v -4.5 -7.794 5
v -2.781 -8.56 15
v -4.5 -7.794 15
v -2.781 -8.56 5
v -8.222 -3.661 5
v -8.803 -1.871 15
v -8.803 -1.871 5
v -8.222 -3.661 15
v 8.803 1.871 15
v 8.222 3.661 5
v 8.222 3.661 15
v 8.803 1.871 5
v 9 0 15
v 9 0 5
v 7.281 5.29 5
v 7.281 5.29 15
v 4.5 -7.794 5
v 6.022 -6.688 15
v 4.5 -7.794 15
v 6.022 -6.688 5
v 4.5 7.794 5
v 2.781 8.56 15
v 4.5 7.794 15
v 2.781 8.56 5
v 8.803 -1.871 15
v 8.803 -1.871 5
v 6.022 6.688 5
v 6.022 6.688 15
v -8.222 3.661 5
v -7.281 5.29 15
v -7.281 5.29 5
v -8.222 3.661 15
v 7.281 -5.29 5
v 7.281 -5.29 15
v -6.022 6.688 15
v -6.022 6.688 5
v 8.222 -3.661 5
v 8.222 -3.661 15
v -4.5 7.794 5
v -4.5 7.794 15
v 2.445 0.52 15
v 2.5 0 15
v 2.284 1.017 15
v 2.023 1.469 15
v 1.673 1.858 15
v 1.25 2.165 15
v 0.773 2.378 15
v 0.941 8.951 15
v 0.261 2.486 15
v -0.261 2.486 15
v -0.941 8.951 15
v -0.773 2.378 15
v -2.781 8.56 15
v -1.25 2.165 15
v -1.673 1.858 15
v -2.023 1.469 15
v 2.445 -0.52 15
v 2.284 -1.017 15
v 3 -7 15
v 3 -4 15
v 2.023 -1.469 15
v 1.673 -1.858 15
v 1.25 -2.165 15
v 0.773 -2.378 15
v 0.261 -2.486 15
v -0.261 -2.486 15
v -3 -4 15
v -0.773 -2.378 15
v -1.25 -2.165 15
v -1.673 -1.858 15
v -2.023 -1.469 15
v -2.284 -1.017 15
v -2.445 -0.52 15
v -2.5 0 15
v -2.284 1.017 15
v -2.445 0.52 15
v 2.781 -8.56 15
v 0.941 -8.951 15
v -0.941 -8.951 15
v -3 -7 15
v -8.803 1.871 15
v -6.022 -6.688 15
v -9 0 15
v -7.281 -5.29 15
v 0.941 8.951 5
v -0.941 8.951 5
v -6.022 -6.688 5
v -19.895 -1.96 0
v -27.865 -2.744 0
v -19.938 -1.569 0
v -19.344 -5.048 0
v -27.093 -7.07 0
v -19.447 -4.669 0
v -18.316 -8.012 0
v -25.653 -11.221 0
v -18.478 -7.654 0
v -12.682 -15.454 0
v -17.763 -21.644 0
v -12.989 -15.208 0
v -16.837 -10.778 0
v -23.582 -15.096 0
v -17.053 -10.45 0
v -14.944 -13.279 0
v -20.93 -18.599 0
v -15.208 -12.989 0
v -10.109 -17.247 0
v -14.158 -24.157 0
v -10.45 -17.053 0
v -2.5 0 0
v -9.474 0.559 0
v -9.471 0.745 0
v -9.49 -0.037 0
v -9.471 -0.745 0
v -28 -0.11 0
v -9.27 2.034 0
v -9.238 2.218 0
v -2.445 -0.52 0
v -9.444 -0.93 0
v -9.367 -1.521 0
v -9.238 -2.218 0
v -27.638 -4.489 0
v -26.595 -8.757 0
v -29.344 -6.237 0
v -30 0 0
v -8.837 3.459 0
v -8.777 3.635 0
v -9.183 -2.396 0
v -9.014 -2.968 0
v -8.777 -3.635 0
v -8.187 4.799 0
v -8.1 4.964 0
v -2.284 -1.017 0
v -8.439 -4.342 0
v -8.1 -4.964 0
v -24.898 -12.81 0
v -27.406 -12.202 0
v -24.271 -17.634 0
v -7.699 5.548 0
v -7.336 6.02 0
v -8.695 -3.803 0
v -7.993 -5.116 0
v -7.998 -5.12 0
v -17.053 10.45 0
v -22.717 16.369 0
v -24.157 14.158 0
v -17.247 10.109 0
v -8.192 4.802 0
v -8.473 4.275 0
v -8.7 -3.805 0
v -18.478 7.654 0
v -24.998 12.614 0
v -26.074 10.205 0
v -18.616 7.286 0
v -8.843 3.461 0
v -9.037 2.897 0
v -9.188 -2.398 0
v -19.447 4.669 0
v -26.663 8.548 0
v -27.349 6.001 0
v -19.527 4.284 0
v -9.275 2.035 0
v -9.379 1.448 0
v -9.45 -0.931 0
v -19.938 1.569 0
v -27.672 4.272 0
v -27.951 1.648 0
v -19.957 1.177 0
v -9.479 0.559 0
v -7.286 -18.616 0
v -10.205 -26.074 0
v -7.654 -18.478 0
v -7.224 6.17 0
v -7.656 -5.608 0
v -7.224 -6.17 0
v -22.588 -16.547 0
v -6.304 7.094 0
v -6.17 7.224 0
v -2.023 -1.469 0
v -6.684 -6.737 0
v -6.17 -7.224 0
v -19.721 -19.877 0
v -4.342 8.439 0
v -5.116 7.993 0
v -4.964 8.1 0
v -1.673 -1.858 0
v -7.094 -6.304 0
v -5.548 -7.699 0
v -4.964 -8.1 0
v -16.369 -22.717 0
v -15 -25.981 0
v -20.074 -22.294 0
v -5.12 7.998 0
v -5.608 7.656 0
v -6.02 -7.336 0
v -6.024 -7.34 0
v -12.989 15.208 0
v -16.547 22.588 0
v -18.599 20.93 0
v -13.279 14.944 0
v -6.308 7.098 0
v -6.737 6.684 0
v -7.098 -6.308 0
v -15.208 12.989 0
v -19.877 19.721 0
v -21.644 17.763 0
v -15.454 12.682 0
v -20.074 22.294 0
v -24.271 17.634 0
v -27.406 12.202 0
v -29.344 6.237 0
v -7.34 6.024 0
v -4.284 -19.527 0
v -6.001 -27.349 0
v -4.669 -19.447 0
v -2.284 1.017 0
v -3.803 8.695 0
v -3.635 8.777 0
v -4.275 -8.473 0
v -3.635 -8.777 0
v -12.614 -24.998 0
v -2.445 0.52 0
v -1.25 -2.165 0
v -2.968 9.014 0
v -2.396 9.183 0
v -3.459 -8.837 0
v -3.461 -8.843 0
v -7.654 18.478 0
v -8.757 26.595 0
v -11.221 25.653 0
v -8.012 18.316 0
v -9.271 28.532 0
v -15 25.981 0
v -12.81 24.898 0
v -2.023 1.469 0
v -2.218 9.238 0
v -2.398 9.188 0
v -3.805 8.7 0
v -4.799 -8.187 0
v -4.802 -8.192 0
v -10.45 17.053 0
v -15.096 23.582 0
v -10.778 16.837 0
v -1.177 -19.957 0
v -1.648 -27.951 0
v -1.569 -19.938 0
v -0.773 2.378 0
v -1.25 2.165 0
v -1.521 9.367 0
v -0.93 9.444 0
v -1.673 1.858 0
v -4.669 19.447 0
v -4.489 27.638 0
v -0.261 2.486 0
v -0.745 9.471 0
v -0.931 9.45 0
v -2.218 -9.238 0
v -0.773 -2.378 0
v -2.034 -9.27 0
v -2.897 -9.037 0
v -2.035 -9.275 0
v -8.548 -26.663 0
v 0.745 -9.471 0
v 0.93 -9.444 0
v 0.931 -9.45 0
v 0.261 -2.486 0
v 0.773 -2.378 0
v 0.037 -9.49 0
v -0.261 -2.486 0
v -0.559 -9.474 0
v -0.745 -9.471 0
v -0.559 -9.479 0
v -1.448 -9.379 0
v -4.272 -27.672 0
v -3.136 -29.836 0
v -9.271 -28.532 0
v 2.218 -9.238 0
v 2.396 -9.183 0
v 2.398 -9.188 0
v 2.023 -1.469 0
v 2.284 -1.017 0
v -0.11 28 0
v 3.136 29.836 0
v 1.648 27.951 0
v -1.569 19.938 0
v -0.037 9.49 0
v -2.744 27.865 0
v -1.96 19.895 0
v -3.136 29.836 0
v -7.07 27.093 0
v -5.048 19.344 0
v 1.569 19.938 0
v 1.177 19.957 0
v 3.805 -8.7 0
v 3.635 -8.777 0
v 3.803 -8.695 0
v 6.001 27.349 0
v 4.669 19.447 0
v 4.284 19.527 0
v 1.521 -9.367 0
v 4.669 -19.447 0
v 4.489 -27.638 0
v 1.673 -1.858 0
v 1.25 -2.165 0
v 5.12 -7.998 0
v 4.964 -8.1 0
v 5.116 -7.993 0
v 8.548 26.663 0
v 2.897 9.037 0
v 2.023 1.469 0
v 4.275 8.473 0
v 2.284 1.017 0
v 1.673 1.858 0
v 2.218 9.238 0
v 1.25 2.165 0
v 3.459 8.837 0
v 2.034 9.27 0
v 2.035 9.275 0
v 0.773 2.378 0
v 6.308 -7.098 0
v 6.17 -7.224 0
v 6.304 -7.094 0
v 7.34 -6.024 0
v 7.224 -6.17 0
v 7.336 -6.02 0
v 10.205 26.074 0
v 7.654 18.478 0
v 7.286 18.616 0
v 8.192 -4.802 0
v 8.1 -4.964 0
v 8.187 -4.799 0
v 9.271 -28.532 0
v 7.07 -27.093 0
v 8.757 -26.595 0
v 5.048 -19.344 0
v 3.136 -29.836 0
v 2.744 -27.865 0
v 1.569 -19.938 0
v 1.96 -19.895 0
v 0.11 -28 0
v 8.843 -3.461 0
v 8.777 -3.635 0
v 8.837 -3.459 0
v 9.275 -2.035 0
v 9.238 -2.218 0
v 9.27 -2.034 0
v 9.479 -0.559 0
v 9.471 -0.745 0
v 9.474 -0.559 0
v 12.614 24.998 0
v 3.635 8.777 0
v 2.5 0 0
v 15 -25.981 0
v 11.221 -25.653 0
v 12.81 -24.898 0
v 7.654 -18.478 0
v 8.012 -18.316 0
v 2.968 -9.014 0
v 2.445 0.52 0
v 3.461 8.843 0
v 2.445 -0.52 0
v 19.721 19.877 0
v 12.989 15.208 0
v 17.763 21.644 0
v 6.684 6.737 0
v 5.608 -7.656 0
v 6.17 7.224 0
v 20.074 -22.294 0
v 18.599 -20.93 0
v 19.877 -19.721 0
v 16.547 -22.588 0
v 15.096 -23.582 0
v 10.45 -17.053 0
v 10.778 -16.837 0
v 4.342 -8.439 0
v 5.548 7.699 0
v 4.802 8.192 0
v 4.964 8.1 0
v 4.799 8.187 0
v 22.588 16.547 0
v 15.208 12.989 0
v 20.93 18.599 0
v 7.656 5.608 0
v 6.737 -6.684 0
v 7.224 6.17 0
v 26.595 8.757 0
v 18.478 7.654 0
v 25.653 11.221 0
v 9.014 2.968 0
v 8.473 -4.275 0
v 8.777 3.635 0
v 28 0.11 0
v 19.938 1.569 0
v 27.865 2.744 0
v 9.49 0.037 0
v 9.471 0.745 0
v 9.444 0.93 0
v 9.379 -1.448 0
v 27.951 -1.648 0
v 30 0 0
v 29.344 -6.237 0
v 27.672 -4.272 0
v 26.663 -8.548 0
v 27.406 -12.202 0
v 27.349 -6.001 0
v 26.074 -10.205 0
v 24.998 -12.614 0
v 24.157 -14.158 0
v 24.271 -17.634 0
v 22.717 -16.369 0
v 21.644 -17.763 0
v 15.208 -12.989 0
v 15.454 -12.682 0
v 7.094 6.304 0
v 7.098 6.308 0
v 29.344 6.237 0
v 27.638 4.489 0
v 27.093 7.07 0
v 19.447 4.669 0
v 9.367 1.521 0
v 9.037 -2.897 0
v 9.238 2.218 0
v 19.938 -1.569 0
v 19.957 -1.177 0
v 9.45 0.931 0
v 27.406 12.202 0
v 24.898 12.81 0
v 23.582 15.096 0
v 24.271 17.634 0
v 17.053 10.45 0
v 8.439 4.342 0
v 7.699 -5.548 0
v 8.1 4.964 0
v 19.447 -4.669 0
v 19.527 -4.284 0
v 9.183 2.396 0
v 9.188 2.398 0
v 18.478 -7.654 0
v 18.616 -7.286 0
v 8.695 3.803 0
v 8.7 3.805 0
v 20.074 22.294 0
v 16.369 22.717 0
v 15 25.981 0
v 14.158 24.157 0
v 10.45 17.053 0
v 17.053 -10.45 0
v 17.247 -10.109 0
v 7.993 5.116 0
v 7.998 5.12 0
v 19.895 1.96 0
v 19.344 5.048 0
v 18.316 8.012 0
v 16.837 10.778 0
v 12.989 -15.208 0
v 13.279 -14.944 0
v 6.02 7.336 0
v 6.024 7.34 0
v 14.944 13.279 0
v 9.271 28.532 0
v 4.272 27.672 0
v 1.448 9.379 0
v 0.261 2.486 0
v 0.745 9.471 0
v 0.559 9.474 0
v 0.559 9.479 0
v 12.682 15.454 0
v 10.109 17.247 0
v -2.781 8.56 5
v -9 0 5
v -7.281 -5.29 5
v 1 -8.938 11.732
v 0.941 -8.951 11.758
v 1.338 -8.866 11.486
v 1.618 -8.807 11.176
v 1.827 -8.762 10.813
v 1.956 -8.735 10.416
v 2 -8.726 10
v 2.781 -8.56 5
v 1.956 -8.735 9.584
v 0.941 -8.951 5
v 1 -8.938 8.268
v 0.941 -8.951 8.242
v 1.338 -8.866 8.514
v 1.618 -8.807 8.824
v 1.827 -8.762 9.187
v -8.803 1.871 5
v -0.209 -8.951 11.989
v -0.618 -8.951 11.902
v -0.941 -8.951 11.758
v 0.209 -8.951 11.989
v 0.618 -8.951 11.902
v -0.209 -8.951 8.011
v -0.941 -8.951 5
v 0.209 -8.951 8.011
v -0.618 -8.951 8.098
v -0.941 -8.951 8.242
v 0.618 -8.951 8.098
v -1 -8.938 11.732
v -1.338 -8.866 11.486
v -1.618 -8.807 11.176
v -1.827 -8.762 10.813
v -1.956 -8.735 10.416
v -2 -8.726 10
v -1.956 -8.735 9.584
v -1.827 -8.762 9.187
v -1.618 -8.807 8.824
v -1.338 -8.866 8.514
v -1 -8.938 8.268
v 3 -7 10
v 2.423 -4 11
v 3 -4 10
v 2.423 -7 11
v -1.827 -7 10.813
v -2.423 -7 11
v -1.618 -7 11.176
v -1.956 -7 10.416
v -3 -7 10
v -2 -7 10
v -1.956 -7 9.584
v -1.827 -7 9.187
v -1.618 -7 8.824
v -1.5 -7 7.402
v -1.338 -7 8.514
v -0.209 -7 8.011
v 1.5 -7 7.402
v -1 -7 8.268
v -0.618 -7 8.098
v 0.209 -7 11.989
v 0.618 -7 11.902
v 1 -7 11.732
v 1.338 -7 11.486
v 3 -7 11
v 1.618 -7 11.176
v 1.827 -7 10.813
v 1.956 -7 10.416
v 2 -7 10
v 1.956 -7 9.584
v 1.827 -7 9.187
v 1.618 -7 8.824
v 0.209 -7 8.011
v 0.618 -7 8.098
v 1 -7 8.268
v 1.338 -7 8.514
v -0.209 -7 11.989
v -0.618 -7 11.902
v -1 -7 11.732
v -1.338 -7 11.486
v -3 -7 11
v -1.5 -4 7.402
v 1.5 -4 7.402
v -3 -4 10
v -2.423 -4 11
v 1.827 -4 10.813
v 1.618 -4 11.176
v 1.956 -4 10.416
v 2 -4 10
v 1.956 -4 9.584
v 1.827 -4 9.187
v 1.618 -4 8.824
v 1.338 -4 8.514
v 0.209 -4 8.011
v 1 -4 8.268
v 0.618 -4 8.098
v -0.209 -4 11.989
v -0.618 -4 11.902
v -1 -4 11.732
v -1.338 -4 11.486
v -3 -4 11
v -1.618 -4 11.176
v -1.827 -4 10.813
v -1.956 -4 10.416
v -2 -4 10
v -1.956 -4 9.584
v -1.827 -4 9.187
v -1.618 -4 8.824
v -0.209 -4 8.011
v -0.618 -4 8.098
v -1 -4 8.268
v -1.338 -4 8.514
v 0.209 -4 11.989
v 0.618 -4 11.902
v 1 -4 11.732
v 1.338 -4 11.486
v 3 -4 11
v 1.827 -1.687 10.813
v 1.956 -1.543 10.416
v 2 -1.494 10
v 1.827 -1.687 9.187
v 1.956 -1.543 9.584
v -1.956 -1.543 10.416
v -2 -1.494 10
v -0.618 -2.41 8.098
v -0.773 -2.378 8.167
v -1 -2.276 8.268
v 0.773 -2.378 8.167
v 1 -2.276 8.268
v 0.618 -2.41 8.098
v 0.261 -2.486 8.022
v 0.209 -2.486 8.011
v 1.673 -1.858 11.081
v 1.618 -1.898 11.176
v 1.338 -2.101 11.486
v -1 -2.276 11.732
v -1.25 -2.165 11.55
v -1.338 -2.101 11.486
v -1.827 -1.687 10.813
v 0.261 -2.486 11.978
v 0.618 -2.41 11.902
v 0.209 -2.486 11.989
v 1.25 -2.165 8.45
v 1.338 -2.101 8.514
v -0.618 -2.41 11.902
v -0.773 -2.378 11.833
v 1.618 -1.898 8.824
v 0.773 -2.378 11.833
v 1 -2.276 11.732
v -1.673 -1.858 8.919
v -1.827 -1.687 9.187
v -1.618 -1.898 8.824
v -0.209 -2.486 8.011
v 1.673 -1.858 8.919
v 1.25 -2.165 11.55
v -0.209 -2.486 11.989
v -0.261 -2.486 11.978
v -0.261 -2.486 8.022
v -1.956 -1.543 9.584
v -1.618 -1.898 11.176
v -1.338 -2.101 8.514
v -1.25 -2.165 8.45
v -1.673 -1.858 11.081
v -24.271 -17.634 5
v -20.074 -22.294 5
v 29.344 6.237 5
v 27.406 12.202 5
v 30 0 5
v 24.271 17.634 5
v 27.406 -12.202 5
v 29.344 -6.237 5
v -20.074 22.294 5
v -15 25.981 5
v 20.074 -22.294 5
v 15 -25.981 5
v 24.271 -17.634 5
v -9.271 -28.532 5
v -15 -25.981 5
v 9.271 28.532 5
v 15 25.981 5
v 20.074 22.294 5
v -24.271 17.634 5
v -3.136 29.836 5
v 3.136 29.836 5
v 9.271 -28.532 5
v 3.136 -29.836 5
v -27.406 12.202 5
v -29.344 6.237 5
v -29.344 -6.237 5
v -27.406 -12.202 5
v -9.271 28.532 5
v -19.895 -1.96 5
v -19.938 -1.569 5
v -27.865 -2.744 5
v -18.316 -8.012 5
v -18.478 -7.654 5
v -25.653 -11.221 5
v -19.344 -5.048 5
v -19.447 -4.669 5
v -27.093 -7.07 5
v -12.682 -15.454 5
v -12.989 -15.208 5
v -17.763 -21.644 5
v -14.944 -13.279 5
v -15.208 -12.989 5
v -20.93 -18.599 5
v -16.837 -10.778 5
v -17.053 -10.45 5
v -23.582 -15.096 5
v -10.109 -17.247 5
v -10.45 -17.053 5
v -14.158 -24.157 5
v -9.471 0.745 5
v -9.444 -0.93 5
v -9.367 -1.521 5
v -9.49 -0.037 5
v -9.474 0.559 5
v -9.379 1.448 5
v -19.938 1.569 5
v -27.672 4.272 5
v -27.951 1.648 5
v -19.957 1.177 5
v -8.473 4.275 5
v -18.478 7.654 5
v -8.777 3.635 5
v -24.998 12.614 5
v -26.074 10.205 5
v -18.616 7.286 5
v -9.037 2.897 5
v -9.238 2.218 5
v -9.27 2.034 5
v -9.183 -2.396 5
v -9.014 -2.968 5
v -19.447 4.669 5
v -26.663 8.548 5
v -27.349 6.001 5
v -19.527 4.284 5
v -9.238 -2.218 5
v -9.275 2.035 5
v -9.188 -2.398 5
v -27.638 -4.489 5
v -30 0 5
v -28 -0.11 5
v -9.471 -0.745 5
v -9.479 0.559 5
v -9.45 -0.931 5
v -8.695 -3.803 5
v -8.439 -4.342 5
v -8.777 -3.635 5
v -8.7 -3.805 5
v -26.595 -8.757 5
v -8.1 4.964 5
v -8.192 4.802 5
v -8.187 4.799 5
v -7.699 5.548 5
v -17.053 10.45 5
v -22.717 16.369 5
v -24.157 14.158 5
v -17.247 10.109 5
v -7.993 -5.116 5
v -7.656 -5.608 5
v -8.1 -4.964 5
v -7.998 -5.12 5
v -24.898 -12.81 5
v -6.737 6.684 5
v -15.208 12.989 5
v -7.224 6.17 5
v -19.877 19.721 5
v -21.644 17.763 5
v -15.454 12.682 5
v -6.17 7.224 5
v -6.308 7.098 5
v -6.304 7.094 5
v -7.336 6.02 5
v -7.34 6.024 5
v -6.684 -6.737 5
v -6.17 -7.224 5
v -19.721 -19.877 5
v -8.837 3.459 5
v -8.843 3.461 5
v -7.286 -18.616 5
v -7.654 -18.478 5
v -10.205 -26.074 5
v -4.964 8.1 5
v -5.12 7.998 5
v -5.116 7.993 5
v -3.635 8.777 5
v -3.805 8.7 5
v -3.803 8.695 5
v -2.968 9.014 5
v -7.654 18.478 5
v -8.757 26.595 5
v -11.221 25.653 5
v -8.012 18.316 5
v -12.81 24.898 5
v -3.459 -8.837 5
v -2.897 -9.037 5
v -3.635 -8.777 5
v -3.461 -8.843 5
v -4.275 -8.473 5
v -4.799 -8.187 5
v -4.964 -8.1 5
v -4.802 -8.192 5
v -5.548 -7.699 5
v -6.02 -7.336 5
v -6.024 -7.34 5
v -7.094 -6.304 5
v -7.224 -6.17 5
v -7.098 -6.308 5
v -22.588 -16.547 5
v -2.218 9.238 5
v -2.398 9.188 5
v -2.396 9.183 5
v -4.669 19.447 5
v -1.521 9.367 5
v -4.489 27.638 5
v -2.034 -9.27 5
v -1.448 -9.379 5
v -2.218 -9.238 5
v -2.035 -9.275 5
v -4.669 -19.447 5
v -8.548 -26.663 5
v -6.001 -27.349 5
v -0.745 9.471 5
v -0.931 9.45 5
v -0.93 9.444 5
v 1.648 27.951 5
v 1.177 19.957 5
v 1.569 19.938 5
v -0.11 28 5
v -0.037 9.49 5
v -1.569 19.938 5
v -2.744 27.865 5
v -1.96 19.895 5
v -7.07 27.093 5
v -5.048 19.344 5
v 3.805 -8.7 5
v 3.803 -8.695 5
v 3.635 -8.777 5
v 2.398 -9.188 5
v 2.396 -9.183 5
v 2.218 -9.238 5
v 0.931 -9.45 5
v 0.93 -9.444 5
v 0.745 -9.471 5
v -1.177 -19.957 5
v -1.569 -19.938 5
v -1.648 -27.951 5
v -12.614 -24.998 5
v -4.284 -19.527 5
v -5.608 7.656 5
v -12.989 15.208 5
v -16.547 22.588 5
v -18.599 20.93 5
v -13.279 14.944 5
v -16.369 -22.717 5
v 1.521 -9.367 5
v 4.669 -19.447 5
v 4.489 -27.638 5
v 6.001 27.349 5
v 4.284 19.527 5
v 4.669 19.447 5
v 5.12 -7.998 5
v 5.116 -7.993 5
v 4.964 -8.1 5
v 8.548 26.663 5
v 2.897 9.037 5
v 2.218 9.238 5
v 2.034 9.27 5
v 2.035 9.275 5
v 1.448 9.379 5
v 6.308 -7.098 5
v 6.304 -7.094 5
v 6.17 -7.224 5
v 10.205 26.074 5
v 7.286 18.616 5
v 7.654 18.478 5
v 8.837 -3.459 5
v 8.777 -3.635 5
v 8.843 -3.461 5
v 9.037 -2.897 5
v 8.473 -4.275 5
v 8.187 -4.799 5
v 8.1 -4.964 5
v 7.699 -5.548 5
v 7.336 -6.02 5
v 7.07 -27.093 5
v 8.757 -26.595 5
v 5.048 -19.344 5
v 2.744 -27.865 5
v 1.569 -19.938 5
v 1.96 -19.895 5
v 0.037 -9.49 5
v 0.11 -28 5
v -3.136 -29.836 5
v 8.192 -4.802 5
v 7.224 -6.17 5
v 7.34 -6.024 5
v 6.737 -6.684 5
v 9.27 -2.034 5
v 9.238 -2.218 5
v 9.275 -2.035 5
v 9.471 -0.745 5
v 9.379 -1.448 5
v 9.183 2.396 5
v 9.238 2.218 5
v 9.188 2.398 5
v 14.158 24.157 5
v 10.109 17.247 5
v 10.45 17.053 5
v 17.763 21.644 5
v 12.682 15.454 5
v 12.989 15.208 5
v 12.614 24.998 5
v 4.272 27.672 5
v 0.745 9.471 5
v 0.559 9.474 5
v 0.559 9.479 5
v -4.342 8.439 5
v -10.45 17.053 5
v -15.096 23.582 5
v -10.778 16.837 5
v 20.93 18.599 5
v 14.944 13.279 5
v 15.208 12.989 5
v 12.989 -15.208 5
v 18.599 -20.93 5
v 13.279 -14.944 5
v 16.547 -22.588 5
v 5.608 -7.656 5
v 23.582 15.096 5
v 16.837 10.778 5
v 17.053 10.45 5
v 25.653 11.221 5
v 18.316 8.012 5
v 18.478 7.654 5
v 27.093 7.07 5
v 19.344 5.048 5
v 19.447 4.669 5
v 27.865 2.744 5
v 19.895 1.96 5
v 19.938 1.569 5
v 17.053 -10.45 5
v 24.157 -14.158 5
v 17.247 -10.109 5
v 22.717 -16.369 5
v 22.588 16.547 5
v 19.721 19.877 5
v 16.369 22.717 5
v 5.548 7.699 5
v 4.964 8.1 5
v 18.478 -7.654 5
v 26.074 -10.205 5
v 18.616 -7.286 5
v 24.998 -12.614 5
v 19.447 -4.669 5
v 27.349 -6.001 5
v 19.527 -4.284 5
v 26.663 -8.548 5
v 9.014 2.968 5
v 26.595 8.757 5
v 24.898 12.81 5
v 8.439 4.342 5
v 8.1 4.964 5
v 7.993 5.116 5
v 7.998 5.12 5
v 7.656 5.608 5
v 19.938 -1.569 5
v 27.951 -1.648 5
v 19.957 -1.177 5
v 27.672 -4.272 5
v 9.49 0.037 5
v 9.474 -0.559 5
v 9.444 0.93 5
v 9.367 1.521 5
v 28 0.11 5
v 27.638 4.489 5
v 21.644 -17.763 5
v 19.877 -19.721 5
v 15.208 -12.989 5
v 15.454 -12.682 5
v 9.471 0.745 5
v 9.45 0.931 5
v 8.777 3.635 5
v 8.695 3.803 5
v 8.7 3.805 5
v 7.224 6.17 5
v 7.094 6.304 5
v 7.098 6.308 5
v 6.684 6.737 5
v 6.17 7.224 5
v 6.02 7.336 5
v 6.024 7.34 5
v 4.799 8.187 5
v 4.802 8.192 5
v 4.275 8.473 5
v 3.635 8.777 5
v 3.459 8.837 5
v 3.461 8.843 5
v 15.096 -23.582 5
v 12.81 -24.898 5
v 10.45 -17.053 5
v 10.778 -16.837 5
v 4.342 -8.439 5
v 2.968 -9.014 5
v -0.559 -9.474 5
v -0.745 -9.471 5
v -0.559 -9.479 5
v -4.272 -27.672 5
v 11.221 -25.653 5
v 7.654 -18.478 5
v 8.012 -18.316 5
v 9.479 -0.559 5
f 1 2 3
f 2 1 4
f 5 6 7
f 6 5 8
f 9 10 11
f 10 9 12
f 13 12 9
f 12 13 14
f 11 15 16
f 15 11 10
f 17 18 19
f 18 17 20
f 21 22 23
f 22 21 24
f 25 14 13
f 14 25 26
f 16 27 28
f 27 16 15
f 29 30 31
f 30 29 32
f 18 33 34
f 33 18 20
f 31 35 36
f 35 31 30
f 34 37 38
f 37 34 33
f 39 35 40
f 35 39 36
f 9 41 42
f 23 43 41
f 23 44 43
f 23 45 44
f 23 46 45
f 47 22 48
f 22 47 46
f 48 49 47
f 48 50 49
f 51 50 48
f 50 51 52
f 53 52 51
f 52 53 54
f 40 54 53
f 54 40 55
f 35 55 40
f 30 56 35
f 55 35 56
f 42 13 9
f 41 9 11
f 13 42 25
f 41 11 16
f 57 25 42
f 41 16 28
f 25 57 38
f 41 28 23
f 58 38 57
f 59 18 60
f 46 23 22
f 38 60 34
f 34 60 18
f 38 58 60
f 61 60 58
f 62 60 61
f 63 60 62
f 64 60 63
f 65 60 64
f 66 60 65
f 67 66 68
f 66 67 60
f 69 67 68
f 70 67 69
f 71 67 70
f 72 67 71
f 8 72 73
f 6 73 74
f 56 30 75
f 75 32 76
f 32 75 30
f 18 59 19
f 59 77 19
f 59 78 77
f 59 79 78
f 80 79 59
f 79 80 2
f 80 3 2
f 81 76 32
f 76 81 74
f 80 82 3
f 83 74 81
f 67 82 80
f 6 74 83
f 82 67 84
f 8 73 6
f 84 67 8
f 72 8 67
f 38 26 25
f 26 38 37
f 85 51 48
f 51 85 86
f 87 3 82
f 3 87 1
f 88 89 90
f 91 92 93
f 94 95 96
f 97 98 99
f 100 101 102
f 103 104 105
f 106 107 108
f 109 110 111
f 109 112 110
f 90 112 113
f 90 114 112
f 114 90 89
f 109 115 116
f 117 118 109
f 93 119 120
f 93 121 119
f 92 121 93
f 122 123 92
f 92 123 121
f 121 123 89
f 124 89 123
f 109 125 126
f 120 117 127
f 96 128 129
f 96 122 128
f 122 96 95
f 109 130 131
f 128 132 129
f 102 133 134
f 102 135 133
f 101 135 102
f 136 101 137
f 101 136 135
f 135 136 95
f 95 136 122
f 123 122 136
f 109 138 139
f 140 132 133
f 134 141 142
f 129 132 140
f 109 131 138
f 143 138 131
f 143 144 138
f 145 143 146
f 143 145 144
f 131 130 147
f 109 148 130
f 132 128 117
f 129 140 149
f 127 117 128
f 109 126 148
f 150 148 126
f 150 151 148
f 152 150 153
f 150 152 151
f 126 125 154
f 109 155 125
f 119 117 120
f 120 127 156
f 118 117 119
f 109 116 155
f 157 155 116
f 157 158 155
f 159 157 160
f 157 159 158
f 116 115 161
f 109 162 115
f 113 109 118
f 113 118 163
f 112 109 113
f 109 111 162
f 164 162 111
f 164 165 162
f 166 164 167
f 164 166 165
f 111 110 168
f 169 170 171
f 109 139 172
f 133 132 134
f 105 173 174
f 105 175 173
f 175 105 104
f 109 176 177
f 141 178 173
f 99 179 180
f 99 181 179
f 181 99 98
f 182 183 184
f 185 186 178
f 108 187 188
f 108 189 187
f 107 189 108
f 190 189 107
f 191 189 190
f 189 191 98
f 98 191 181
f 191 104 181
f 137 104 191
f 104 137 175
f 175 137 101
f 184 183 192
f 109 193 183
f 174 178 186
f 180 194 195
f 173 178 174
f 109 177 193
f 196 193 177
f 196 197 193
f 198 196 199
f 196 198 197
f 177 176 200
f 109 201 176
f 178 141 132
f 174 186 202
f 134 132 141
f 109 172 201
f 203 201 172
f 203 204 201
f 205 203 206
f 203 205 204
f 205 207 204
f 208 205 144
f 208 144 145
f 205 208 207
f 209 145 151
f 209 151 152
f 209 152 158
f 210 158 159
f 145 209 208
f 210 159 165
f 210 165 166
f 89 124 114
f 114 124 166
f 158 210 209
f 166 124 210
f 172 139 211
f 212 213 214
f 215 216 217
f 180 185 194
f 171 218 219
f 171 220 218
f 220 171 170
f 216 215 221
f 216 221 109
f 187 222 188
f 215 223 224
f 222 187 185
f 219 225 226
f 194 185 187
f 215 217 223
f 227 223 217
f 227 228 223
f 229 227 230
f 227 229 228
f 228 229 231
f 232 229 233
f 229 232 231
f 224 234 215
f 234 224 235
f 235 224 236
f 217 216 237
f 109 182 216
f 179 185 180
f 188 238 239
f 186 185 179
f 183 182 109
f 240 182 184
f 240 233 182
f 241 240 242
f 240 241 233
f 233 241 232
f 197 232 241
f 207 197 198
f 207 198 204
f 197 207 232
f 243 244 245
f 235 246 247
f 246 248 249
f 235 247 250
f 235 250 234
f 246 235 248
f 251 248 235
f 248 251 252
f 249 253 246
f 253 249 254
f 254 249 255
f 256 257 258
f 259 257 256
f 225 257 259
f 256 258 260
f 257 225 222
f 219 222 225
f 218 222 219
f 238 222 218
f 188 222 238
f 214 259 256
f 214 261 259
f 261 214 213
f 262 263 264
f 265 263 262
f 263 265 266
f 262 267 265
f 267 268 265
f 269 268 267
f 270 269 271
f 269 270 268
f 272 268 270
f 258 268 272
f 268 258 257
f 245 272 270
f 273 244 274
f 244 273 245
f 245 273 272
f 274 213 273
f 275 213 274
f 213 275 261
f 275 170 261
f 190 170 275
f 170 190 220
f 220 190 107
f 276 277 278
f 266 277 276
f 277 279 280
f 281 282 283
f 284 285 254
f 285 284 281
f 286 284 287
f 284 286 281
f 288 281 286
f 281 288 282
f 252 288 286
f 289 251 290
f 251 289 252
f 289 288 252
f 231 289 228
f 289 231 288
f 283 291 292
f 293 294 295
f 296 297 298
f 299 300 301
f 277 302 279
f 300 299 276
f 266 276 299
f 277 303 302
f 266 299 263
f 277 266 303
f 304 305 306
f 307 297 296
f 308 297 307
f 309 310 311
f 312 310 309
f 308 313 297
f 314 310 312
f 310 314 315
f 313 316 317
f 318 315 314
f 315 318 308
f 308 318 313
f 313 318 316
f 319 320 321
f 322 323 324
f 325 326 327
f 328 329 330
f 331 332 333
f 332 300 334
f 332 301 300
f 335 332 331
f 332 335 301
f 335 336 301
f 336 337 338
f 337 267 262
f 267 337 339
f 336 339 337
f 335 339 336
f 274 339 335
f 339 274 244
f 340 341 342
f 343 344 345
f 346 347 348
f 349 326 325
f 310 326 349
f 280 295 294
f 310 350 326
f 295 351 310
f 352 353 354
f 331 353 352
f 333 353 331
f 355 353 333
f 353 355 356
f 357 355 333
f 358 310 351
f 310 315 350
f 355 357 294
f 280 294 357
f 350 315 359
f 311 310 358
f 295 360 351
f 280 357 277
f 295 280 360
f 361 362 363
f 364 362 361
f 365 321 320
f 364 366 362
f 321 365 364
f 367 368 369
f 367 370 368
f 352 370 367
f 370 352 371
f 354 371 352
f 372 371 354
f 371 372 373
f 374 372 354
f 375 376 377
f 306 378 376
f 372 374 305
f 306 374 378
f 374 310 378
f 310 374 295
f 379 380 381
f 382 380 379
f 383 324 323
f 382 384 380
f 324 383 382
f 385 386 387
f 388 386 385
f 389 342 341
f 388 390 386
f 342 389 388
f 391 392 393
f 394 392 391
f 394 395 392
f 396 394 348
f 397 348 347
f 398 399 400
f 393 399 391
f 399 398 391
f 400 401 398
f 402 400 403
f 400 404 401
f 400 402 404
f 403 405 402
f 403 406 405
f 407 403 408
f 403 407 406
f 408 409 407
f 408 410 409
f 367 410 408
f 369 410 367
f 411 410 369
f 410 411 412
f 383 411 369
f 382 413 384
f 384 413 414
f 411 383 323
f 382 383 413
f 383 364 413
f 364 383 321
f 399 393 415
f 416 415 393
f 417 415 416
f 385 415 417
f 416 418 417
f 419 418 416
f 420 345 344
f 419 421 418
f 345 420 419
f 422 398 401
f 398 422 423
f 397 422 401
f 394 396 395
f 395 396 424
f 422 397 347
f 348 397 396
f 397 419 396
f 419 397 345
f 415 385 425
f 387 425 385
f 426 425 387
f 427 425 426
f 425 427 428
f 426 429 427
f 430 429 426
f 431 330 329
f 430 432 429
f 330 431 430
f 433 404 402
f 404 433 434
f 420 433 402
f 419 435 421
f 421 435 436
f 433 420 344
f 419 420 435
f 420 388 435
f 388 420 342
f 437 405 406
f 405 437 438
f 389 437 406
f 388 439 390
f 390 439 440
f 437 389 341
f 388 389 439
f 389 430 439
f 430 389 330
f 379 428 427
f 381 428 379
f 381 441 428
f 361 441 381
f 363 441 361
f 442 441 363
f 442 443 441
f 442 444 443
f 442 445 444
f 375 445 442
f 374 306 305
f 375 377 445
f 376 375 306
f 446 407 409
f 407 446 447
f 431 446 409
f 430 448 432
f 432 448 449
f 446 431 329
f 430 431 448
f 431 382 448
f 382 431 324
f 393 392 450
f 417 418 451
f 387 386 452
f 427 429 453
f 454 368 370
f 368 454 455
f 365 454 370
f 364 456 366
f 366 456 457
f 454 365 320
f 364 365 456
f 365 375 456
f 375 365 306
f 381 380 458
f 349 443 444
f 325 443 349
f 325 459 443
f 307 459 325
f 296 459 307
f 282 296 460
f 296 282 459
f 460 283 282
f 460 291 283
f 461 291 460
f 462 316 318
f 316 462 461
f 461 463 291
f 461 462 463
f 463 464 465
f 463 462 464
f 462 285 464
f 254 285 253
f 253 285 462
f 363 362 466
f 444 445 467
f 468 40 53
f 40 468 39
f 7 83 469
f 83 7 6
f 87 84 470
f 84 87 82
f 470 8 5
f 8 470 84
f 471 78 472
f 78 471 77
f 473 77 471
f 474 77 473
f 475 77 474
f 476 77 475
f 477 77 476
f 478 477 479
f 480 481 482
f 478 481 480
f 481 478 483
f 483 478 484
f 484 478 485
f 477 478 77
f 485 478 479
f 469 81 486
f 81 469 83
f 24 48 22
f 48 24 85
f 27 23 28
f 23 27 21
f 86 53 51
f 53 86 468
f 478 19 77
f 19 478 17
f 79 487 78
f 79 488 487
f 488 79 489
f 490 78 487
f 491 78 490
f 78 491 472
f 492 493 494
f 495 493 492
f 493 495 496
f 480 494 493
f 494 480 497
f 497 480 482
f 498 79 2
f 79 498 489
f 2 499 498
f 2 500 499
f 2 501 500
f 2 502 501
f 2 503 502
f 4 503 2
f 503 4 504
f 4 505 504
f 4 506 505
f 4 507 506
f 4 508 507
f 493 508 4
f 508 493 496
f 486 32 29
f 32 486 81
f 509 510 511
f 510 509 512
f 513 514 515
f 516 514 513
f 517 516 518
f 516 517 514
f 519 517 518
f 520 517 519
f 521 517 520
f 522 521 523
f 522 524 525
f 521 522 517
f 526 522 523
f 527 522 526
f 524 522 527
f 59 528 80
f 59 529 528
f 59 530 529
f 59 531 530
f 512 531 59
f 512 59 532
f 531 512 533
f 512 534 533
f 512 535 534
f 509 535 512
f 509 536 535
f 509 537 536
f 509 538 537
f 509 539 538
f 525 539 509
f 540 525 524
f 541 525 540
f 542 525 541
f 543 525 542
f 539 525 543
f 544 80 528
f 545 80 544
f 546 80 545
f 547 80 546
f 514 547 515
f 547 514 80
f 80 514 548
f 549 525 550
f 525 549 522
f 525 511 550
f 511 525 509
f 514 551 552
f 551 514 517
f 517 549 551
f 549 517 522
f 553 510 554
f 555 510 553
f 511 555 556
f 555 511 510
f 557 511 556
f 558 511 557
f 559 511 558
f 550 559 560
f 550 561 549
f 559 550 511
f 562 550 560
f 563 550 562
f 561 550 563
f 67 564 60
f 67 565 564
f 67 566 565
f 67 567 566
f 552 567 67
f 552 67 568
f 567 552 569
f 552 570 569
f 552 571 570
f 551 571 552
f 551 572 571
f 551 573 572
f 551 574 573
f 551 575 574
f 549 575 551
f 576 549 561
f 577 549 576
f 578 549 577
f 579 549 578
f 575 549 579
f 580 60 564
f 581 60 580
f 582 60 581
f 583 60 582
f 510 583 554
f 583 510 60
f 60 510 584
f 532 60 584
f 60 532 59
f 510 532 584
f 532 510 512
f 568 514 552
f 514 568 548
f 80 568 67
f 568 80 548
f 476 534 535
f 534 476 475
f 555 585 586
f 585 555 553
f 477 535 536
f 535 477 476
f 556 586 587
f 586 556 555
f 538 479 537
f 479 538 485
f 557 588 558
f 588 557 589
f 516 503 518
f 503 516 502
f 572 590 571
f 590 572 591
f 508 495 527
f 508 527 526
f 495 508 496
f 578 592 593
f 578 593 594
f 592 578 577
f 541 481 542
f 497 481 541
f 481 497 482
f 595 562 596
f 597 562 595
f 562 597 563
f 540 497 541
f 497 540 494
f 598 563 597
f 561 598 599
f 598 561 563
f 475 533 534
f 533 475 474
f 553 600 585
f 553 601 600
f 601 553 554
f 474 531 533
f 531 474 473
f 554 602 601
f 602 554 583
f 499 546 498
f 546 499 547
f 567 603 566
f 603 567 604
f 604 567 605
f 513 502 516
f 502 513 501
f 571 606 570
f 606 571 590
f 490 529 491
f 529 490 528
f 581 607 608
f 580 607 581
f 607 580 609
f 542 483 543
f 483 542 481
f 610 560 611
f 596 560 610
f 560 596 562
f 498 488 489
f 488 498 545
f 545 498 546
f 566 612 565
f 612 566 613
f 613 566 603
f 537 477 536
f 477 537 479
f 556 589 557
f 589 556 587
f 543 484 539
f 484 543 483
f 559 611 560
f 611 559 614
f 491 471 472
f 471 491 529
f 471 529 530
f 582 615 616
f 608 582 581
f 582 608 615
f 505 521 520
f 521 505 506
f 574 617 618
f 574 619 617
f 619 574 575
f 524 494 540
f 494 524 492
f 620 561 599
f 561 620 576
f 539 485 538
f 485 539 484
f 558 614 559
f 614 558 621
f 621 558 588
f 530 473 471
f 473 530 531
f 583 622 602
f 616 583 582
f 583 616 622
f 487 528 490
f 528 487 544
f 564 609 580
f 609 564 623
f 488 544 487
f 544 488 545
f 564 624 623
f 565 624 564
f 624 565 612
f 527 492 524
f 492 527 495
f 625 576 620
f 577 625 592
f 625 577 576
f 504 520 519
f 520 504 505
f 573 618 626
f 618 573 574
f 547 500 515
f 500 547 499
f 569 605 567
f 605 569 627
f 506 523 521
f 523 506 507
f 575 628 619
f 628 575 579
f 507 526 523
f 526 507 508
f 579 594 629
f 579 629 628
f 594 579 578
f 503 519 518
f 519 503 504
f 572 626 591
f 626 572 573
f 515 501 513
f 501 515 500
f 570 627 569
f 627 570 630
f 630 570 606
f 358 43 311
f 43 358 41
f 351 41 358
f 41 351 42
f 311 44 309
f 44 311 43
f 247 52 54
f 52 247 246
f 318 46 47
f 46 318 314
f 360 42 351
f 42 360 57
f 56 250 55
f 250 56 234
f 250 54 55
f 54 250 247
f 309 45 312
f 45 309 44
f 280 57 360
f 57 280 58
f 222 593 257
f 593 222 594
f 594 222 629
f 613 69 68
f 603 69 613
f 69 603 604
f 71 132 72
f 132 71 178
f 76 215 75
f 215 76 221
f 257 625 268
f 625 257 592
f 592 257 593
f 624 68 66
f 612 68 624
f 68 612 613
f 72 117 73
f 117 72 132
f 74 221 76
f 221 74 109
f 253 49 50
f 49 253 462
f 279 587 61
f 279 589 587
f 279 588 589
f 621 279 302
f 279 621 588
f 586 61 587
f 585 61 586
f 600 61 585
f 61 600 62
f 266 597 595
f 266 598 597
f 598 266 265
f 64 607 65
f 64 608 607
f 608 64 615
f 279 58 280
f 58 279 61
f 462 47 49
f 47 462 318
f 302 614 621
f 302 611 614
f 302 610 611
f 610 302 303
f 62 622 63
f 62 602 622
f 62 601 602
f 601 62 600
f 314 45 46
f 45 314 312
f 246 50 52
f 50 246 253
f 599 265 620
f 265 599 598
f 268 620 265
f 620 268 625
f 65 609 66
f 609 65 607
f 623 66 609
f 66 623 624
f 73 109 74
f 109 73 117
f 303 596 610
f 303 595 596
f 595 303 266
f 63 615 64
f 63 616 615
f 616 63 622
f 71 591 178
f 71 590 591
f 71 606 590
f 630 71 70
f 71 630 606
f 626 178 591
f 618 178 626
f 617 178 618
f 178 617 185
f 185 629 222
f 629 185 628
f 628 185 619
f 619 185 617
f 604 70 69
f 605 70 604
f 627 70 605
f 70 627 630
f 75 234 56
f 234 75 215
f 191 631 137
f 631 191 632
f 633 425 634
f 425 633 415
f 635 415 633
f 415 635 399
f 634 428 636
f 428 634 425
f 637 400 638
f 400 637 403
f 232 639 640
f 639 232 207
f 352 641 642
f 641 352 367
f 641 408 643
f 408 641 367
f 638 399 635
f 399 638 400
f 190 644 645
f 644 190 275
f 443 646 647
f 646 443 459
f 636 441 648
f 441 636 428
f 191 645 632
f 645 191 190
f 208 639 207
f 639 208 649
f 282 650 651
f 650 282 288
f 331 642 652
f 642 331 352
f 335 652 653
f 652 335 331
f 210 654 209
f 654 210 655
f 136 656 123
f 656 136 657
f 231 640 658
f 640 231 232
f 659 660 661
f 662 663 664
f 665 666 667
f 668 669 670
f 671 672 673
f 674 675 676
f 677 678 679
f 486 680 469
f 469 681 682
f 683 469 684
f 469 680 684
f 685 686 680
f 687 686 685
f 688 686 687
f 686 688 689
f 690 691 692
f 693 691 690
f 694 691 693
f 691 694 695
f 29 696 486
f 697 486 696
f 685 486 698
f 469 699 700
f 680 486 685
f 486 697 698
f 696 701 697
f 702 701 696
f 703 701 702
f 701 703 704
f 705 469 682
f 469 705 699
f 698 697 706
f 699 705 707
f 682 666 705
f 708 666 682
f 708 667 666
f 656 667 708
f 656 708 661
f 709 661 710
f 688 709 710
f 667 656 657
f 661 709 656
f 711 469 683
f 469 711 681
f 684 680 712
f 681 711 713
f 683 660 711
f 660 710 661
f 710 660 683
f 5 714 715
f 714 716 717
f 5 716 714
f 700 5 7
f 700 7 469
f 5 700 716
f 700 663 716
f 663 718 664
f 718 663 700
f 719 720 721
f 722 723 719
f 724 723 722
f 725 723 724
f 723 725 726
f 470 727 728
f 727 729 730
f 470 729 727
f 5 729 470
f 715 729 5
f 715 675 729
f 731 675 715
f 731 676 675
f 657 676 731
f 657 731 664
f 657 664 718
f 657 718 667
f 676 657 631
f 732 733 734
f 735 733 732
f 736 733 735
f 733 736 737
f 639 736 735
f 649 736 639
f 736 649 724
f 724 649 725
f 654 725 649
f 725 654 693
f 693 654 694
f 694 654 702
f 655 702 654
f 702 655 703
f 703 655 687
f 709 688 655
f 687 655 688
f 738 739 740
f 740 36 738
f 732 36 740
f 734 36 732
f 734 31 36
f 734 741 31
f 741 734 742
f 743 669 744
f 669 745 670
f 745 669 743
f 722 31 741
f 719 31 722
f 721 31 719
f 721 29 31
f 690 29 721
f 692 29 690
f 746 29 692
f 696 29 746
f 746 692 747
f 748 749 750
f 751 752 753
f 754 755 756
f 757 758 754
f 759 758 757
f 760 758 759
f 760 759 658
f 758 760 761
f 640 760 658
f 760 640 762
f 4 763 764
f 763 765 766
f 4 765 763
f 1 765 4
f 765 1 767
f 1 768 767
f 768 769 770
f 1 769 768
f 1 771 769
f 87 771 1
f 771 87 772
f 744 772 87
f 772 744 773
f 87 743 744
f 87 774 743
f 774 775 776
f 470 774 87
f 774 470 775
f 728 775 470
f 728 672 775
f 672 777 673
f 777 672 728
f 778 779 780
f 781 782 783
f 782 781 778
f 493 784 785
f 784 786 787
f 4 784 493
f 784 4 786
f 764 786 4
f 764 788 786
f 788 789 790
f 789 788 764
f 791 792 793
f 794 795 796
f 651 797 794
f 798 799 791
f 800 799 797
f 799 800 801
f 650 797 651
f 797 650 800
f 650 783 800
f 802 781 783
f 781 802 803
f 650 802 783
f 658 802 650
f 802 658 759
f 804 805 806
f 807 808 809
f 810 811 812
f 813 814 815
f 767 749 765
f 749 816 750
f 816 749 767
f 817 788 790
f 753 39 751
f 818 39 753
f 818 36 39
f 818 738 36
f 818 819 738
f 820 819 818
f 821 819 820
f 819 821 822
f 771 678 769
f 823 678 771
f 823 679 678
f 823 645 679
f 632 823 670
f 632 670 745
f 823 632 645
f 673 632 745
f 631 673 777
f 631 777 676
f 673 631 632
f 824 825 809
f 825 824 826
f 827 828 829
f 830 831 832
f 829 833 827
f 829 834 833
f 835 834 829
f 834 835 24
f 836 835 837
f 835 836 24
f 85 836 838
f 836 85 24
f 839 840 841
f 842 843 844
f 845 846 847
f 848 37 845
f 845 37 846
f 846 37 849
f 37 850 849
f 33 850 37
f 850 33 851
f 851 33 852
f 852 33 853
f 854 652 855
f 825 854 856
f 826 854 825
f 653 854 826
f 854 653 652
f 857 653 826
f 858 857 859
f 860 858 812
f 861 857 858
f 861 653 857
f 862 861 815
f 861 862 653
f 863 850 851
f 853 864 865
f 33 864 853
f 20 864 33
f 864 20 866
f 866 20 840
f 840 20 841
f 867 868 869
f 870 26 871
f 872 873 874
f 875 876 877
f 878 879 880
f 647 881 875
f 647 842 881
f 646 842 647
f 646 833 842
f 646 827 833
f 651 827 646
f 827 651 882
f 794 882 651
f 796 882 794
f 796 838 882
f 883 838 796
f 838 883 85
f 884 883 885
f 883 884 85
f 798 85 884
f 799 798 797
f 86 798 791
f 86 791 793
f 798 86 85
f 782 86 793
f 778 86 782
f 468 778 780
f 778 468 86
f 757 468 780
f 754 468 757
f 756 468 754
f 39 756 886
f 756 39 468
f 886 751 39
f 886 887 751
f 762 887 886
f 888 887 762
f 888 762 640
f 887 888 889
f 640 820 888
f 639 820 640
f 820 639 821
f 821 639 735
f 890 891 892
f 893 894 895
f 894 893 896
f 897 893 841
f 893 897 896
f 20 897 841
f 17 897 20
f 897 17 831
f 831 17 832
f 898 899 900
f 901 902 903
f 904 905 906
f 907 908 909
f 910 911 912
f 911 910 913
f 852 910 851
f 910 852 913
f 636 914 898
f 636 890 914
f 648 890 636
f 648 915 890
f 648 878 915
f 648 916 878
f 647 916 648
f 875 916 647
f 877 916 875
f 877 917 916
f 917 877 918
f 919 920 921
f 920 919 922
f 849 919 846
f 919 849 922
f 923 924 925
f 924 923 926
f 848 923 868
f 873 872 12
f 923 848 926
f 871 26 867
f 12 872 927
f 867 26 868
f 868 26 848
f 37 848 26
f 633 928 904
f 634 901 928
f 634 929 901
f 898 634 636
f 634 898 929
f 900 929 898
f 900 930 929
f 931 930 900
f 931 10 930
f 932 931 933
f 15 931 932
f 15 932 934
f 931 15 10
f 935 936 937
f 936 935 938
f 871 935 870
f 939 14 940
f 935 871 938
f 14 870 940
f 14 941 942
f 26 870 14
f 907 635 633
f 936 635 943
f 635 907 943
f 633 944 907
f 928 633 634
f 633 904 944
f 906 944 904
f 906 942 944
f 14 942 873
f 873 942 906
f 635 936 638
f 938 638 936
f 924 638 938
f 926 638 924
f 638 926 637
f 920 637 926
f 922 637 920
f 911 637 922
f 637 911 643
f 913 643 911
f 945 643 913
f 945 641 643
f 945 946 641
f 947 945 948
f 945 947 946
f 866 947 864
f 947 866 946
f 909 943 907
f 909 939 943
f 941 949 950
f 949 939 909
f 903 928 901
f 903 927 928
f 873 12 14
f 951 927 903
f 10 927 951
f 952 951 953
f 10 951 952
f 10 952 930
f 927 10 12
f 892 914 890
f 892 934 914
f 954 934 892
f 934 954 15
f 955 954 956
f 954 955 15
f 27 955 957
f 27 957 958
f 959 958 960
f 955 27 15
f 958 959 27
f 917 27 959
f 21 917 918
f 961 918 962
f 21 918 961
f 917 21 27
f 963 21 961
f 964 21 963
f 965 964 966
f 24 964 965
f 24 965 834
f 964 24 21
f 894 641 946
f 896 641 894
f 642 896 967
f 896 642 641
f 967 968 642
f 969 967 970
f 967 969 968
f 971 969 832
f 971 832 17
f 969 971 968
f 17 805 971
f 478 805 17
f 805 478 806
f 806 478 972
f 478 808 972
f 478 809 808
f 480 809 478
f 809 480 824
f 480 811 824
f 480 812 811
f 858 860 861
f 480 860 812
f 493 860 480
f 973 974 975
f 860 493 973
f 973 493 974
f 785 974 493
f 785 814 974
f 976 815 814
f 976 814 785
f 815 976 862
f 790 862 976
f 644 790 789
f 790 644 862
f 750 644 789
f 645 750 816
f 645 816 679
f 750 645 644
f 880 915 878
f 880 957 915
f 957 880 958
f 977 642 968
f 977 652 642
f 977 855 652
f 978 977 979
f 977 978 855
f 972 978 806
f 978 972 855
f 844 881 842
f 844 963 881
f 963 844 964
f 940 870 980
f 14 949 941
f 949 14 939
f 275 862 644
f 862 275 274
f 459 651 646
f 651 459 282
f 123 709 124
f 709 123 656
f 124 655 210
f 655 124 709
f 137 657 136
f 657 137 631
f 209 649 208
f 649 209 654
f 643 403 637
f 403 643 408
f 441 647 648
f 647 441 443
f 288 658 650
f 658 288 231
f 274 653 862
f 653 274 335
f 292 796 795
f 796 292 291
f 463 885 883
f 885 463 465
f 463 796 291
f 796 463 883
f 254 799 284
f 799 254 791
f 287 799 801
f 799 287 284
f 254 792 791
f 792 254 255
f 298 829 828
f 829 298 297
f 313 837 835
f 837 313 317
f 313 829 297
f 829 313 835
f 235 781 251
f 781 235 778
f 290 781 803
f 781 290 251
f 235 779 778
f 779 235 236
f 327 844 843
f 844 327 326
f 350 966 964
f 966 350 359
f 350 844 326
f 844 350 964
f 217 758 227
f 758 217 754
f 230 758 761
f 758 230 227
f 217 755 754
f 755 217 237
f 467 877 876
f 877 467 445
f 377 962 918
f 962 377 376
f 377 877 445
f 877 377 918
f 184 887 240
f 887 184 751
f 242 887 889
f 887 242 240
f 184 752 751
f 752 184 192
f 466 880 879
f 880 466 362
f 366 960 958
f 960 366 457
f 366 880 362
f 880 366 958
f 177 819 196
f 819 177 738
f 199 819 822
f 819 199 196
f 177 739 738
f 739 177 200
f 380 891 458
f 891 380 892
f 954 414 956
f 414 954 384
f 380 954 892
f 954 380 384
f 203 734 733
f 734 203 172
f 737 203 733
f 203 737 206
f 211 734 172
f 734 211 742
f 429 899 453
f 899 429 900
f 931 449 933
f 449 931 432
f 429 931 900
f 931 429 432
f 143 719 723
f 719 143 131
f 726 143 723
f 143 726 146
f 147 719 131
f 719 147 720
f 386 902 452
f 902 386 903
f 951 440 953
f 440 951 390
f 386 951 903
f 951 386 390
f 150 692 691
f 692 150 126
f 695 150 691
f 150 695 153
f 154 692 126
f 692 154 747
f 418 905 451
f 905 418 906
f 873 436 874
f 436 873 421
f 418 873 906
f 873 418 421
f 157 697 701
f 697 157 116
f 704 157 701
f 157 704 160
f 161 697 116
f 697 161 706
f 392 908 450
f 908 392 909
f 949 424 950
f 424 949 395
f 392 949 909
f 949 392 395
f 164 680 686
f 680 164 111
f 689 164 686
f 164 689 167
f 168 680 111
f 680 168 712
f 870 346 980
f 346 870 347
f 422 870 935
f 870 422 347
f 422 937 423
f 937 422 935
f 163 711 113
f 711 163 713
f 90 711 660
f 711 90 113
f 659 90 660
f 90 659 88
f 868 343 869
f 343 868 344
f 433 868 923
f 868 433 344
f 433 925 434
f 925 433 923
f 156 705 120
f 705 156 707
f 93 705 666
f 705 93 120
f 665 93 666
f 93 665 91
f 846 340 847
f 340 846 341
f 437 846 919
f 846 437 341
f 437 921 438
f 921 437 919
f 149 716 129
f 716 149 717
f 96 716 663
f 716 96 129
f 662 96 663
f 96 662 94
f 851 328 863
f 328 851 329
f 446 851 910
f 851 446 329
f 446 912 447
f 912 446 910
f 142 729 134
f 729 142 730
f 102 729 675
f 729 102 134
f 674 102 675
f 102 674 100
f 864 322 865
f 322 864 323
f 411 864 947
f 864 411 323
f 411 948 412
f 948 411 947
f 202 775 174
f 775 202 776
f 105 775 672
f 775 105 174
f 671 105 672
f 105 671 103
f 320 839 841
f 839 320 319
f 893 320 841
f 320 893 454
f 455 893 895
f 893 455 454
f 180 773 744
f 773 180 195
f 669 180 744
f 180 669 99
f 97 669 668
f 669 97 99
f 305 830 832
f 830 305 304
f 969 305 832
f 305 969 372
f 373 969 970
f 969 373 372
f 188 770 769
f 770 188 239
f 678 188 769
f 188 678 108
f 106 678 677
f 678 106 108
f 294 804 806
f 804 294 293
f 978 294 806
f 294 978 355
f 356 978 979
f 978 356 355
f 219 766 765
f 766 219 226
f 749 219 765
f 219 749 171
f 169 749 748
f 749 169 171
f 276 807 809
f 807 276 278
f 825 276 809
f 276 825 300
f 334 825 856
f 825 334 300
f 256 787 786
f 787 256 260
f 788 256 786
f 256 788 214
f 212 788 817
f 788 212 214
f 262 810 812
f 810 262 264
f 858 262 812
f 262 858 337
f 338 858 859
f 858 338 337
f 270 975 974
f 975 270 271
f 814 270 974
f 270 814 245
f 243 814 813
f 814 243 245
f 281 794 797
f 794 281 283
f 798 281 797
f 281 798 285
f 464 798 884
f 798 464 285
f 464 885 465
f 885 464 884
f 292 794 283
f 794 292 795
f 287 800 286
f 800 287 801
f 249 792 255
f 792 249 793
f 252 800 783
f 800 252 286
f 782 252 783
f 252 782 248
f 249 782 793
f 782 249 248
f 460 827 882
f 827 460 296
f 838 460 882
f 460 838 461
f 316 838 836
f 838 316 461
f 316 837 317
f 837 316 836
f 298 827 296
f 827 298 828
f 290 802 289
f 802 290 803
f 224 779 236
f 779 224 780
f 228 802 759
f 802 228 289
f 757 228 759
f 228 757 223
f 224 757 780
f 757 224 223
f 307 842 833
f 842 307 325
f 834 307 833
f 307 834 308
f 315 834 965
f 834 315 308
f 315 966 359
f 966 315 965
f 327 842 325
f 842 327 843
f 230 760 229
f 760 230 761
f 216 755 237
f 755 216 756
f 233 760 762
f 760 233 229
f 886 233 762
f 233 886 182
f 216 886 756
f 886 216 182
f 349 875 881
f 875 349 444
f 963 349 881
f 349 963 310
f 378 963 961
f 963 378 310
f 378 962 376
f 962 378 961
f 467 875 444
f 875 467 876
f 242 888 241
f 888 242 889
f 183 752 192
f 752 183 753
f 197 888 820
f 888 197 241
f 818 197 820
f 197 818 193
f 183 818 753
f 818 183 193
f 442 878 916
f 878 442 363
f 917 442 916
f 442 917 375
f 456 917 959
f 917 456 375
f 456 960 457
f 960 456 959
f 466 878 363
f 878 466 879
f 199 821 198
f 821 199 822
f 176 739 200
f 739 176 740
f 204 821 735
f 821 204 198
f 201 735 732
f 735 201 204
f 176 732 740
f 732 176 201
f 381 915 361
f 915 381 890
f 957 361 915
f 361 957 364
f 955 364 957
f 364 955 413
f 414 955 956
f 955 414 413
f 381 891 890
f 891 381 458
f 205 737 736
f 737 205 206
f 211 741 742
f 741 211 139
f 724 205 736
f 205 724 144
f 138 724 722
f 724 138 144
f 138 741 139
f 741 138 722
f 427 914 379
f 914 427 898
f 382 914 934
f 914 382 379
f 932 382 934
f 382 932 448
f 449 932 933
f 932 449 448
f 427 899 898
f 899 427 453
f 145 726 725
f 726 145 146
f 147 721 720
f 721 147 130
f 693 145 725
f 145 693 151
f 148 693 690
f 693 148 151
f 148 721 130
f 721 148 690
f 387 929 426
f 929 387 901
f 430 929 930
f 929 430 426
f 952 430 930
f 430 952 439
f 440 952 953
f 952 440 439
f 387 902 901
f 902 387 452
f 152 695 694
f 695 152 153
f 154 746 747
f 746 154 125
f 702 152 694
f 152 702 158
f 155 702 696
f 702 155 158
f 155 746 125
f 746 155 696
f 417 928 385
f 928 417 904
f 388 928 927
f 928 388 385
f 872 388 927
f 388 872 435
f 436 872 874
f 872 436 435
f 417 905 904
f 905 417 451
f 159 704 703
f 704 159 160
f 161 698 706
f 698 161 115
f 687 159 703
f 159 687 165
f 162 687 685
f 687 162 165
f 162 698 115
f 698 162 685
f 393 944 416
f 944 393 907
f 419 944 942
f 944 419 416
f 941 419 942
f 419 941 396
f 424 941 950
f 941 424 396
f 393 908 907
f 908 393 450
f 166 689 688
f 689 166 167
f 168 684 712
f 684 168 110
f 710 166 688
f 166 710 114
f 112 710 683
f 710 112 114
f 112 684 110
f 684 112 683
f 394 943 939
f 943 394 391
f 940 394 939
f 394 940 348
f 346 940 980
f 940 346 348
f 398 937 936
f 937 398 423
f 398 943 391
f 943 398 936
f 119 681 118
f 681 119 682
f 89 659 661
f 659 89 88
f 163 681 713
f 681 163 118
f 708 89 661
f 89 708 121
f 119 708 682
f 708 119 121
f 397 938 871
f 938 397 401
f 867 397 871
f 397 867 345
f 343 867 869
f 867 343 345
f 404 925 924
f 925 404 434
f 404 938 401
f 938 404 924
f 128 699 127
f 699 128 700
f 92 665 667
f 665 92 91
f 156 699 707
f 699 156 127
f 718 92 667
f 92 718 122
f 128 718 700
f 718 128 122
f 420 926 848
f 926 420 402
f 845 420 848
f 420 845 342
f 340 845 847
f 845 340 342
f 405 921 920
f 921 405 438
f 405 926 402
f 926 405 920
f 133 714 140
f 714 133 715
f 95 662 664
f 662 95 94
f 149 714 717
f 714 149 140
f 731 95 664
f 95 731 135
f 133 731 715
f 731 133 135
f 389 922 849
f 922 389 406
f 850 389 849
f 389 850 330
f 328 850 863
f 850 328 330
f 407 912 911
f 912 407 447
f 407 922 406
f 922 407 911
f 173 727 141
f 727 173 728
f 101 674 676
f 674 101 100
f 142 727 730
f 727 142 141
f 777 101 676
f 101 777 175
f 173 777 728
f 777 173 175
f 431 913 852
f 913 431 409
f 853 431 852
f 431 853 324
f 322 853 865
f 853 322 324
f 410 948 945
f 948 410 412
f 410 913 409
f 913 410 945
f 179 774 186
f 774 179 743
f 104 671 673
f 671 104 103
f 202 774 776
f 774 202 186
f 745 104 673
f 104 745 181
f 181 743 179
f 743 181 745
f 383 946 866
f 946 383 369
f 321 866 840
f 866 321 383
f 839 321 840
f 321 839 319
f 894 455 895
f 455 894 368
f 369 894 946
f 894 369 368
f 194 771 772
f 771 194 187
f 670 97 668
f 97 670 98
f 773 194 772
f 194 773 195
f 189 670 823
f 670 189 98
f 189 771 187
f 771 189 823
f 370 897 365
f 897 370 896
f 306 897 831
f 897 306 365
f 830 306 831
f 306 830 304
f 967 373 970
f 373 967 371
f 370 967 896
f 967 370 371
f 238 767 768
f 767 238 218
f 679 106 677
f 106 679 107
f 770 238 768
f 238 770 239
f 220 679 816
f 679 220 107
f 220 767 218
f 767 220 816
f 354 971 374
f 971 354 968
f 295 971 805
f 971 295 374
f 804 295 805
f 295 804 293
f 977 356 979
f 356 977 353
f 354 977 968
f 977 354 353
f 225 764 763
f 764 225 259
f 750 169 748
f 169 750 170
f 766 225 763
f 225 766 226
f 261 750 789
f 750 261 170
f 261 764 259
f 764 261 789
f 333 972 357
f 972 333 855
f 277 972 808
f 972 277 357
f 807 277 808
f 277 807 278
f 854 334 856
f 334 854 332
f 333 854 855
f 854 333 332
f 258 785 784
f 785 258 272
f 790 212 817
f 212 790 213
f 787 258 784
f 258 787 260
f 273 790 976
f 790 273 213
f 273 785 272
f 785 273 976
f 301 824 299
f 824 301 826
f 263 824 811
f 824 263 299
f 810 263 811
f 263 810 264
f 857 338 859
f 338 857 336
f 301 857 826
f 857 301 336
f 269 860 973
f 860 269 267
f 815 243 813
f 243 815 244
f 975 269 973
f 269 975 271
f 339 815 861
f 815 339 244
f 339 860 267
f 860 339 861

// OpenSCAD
// This is a customizable chopper wheel -- derived from
// Parametric encoder wheels http://www.thingiverse.com/thing:61434
// and the shaft lock from the less versatile Parametric open-source chopper wheel http://www.thingiverse.com/thing:28121


//Customizer Variables
//Number of interrupters
NUM_Int=40; // [2:120]
// Outer Radius
R_OUTER = 30;			

// Filled inner radius
R_INNER = 20;				

// Inner radius 2, phase shifted interrupters for direction detection
R_INNER2 = 9.5;			

//Mounting hole radius
R_HOLE = 4;			

// Filled Border Thickness
BORDER = 2;				

//Thickness of wheel
THICKNESS = 5;	   

// Thickness of the mouting hole outline
THICKNESS_MOUNT = 2; 

//Interrupter-width modifier, if =0 then interrupter is hole, if <0 then interrupter > hole and if >0 then interrupter < hole
INT_MODIFIER = -0.2;  // [-1:1] 

//Customizer variables end

//Non-customizer variables
z=R_HOLE; //The diameter of the motor shaft.
a=6; //m3 nut Diameter
b=3; //m3 nut thickness
c=3; //m3 screw diameter
NUM_SECTIONS = NUM_Int*2; //number of sections
R_MOUNT = 3;				/* mounting hole outline radius */
R_CROSS = 1.9;			/* center-cross for 2d encoders*/

shaft_lock();

module shaft_lock(){
difference(){
cylinder(15,(z*3)/2+3,(z*3)/2+3);
rotate([90,0,0])translate([0,10,4])hexagon(b,a/2);
translate([0,-5.5,15])cube([a,b,8],center=true);
translate([0,0,10])#rotate([90,0,0])cylinder(100,(c+1)/2,(c+1)/2);
cylinder(20,(z+1)/2,(z+1)/2);
}
}

module reg_polygon(sides,radius)
{
  function dia(r) = sqrt(pow(r*2,2)/2);  
  if(sides<2) square([radius,0]);
  if(sides==3) triangle(radius);
  if(sides==4) square([dia(radius),dia(radius)],center=true);
  if(sides>4) circle(r=radius,$fn=sides);
}

module hexagon_f(radius)
{
  reg_polygon(6,radius);
}

module hexagon(height,radius) 
{
  linear_extrude(height=height) hexagon_f(radius);
}



$fs = 0.01;

/* generates encoder contour */
module encoder_contour(n,rin,rout,mod){
	 for (i = [1:2:n])
    {
        assign (a1 = i*360/n, a2 = (i+1+mod)*360/n )
        {	
                polygon(points=[
						[cos(a2)*rin,sin(a2)*rin],
						[cos(a1)*rin,sin(a1)*rin],
						[cos(a1)*rout,sin(a1)*rout],
						[cos(a2)*rout,sin(a2)*rout] 
					]);
			}
    }	
}

/* use this to create a hole outline */
module hole2d(rhole,rcross){
	 circle(r = rhole);
	 polygon(points=[[0,0.1],[rcross,0],[0,-0.1],[-rcross,0] ] );
	 polygon(points=[[0.1,0],[0,rcross],[-0.1,0],[0,-rcross] ] );
}

module encoder3d(n,rin,rin2,rout,rhole,rmount,border,mod,t,tm) {
	echo();
	difference(){
		union(){
			cylinder(h=t,r=rout);
			cylinder(h=tm,r=rmount);			
		}
		linear_extrude(height=5*t,center=true) encoder_contour(n,rin,rin2,mod);
		rotate([0,0,360/(4*n)]) linear_extrude(height=5*t,center=true) encoder_contour(n,rin2-$fs,rout-border,mod);
		cylinder(h=5*tm,r=rhole,center=true);
	}
}

module encoder2d(rin,rout,rhole,rcross,mod) {
	hole2d(rhole,rcross);
	encoder_contour(rin,rout,mod);
}


encoder3d(NUM_SECTIONS,R_INNER,R_INNER2,R_OUTER,R_HOLE,R_MOUNT,BORDER,INT_MODIFIER,THICKNESS,THICKNESS_MOUNT);
//encoder2d(NUM_SECTIONS,R_INNER,R_OUTER,R_HOLE,R_CROSS,INT_MODIFIER);
